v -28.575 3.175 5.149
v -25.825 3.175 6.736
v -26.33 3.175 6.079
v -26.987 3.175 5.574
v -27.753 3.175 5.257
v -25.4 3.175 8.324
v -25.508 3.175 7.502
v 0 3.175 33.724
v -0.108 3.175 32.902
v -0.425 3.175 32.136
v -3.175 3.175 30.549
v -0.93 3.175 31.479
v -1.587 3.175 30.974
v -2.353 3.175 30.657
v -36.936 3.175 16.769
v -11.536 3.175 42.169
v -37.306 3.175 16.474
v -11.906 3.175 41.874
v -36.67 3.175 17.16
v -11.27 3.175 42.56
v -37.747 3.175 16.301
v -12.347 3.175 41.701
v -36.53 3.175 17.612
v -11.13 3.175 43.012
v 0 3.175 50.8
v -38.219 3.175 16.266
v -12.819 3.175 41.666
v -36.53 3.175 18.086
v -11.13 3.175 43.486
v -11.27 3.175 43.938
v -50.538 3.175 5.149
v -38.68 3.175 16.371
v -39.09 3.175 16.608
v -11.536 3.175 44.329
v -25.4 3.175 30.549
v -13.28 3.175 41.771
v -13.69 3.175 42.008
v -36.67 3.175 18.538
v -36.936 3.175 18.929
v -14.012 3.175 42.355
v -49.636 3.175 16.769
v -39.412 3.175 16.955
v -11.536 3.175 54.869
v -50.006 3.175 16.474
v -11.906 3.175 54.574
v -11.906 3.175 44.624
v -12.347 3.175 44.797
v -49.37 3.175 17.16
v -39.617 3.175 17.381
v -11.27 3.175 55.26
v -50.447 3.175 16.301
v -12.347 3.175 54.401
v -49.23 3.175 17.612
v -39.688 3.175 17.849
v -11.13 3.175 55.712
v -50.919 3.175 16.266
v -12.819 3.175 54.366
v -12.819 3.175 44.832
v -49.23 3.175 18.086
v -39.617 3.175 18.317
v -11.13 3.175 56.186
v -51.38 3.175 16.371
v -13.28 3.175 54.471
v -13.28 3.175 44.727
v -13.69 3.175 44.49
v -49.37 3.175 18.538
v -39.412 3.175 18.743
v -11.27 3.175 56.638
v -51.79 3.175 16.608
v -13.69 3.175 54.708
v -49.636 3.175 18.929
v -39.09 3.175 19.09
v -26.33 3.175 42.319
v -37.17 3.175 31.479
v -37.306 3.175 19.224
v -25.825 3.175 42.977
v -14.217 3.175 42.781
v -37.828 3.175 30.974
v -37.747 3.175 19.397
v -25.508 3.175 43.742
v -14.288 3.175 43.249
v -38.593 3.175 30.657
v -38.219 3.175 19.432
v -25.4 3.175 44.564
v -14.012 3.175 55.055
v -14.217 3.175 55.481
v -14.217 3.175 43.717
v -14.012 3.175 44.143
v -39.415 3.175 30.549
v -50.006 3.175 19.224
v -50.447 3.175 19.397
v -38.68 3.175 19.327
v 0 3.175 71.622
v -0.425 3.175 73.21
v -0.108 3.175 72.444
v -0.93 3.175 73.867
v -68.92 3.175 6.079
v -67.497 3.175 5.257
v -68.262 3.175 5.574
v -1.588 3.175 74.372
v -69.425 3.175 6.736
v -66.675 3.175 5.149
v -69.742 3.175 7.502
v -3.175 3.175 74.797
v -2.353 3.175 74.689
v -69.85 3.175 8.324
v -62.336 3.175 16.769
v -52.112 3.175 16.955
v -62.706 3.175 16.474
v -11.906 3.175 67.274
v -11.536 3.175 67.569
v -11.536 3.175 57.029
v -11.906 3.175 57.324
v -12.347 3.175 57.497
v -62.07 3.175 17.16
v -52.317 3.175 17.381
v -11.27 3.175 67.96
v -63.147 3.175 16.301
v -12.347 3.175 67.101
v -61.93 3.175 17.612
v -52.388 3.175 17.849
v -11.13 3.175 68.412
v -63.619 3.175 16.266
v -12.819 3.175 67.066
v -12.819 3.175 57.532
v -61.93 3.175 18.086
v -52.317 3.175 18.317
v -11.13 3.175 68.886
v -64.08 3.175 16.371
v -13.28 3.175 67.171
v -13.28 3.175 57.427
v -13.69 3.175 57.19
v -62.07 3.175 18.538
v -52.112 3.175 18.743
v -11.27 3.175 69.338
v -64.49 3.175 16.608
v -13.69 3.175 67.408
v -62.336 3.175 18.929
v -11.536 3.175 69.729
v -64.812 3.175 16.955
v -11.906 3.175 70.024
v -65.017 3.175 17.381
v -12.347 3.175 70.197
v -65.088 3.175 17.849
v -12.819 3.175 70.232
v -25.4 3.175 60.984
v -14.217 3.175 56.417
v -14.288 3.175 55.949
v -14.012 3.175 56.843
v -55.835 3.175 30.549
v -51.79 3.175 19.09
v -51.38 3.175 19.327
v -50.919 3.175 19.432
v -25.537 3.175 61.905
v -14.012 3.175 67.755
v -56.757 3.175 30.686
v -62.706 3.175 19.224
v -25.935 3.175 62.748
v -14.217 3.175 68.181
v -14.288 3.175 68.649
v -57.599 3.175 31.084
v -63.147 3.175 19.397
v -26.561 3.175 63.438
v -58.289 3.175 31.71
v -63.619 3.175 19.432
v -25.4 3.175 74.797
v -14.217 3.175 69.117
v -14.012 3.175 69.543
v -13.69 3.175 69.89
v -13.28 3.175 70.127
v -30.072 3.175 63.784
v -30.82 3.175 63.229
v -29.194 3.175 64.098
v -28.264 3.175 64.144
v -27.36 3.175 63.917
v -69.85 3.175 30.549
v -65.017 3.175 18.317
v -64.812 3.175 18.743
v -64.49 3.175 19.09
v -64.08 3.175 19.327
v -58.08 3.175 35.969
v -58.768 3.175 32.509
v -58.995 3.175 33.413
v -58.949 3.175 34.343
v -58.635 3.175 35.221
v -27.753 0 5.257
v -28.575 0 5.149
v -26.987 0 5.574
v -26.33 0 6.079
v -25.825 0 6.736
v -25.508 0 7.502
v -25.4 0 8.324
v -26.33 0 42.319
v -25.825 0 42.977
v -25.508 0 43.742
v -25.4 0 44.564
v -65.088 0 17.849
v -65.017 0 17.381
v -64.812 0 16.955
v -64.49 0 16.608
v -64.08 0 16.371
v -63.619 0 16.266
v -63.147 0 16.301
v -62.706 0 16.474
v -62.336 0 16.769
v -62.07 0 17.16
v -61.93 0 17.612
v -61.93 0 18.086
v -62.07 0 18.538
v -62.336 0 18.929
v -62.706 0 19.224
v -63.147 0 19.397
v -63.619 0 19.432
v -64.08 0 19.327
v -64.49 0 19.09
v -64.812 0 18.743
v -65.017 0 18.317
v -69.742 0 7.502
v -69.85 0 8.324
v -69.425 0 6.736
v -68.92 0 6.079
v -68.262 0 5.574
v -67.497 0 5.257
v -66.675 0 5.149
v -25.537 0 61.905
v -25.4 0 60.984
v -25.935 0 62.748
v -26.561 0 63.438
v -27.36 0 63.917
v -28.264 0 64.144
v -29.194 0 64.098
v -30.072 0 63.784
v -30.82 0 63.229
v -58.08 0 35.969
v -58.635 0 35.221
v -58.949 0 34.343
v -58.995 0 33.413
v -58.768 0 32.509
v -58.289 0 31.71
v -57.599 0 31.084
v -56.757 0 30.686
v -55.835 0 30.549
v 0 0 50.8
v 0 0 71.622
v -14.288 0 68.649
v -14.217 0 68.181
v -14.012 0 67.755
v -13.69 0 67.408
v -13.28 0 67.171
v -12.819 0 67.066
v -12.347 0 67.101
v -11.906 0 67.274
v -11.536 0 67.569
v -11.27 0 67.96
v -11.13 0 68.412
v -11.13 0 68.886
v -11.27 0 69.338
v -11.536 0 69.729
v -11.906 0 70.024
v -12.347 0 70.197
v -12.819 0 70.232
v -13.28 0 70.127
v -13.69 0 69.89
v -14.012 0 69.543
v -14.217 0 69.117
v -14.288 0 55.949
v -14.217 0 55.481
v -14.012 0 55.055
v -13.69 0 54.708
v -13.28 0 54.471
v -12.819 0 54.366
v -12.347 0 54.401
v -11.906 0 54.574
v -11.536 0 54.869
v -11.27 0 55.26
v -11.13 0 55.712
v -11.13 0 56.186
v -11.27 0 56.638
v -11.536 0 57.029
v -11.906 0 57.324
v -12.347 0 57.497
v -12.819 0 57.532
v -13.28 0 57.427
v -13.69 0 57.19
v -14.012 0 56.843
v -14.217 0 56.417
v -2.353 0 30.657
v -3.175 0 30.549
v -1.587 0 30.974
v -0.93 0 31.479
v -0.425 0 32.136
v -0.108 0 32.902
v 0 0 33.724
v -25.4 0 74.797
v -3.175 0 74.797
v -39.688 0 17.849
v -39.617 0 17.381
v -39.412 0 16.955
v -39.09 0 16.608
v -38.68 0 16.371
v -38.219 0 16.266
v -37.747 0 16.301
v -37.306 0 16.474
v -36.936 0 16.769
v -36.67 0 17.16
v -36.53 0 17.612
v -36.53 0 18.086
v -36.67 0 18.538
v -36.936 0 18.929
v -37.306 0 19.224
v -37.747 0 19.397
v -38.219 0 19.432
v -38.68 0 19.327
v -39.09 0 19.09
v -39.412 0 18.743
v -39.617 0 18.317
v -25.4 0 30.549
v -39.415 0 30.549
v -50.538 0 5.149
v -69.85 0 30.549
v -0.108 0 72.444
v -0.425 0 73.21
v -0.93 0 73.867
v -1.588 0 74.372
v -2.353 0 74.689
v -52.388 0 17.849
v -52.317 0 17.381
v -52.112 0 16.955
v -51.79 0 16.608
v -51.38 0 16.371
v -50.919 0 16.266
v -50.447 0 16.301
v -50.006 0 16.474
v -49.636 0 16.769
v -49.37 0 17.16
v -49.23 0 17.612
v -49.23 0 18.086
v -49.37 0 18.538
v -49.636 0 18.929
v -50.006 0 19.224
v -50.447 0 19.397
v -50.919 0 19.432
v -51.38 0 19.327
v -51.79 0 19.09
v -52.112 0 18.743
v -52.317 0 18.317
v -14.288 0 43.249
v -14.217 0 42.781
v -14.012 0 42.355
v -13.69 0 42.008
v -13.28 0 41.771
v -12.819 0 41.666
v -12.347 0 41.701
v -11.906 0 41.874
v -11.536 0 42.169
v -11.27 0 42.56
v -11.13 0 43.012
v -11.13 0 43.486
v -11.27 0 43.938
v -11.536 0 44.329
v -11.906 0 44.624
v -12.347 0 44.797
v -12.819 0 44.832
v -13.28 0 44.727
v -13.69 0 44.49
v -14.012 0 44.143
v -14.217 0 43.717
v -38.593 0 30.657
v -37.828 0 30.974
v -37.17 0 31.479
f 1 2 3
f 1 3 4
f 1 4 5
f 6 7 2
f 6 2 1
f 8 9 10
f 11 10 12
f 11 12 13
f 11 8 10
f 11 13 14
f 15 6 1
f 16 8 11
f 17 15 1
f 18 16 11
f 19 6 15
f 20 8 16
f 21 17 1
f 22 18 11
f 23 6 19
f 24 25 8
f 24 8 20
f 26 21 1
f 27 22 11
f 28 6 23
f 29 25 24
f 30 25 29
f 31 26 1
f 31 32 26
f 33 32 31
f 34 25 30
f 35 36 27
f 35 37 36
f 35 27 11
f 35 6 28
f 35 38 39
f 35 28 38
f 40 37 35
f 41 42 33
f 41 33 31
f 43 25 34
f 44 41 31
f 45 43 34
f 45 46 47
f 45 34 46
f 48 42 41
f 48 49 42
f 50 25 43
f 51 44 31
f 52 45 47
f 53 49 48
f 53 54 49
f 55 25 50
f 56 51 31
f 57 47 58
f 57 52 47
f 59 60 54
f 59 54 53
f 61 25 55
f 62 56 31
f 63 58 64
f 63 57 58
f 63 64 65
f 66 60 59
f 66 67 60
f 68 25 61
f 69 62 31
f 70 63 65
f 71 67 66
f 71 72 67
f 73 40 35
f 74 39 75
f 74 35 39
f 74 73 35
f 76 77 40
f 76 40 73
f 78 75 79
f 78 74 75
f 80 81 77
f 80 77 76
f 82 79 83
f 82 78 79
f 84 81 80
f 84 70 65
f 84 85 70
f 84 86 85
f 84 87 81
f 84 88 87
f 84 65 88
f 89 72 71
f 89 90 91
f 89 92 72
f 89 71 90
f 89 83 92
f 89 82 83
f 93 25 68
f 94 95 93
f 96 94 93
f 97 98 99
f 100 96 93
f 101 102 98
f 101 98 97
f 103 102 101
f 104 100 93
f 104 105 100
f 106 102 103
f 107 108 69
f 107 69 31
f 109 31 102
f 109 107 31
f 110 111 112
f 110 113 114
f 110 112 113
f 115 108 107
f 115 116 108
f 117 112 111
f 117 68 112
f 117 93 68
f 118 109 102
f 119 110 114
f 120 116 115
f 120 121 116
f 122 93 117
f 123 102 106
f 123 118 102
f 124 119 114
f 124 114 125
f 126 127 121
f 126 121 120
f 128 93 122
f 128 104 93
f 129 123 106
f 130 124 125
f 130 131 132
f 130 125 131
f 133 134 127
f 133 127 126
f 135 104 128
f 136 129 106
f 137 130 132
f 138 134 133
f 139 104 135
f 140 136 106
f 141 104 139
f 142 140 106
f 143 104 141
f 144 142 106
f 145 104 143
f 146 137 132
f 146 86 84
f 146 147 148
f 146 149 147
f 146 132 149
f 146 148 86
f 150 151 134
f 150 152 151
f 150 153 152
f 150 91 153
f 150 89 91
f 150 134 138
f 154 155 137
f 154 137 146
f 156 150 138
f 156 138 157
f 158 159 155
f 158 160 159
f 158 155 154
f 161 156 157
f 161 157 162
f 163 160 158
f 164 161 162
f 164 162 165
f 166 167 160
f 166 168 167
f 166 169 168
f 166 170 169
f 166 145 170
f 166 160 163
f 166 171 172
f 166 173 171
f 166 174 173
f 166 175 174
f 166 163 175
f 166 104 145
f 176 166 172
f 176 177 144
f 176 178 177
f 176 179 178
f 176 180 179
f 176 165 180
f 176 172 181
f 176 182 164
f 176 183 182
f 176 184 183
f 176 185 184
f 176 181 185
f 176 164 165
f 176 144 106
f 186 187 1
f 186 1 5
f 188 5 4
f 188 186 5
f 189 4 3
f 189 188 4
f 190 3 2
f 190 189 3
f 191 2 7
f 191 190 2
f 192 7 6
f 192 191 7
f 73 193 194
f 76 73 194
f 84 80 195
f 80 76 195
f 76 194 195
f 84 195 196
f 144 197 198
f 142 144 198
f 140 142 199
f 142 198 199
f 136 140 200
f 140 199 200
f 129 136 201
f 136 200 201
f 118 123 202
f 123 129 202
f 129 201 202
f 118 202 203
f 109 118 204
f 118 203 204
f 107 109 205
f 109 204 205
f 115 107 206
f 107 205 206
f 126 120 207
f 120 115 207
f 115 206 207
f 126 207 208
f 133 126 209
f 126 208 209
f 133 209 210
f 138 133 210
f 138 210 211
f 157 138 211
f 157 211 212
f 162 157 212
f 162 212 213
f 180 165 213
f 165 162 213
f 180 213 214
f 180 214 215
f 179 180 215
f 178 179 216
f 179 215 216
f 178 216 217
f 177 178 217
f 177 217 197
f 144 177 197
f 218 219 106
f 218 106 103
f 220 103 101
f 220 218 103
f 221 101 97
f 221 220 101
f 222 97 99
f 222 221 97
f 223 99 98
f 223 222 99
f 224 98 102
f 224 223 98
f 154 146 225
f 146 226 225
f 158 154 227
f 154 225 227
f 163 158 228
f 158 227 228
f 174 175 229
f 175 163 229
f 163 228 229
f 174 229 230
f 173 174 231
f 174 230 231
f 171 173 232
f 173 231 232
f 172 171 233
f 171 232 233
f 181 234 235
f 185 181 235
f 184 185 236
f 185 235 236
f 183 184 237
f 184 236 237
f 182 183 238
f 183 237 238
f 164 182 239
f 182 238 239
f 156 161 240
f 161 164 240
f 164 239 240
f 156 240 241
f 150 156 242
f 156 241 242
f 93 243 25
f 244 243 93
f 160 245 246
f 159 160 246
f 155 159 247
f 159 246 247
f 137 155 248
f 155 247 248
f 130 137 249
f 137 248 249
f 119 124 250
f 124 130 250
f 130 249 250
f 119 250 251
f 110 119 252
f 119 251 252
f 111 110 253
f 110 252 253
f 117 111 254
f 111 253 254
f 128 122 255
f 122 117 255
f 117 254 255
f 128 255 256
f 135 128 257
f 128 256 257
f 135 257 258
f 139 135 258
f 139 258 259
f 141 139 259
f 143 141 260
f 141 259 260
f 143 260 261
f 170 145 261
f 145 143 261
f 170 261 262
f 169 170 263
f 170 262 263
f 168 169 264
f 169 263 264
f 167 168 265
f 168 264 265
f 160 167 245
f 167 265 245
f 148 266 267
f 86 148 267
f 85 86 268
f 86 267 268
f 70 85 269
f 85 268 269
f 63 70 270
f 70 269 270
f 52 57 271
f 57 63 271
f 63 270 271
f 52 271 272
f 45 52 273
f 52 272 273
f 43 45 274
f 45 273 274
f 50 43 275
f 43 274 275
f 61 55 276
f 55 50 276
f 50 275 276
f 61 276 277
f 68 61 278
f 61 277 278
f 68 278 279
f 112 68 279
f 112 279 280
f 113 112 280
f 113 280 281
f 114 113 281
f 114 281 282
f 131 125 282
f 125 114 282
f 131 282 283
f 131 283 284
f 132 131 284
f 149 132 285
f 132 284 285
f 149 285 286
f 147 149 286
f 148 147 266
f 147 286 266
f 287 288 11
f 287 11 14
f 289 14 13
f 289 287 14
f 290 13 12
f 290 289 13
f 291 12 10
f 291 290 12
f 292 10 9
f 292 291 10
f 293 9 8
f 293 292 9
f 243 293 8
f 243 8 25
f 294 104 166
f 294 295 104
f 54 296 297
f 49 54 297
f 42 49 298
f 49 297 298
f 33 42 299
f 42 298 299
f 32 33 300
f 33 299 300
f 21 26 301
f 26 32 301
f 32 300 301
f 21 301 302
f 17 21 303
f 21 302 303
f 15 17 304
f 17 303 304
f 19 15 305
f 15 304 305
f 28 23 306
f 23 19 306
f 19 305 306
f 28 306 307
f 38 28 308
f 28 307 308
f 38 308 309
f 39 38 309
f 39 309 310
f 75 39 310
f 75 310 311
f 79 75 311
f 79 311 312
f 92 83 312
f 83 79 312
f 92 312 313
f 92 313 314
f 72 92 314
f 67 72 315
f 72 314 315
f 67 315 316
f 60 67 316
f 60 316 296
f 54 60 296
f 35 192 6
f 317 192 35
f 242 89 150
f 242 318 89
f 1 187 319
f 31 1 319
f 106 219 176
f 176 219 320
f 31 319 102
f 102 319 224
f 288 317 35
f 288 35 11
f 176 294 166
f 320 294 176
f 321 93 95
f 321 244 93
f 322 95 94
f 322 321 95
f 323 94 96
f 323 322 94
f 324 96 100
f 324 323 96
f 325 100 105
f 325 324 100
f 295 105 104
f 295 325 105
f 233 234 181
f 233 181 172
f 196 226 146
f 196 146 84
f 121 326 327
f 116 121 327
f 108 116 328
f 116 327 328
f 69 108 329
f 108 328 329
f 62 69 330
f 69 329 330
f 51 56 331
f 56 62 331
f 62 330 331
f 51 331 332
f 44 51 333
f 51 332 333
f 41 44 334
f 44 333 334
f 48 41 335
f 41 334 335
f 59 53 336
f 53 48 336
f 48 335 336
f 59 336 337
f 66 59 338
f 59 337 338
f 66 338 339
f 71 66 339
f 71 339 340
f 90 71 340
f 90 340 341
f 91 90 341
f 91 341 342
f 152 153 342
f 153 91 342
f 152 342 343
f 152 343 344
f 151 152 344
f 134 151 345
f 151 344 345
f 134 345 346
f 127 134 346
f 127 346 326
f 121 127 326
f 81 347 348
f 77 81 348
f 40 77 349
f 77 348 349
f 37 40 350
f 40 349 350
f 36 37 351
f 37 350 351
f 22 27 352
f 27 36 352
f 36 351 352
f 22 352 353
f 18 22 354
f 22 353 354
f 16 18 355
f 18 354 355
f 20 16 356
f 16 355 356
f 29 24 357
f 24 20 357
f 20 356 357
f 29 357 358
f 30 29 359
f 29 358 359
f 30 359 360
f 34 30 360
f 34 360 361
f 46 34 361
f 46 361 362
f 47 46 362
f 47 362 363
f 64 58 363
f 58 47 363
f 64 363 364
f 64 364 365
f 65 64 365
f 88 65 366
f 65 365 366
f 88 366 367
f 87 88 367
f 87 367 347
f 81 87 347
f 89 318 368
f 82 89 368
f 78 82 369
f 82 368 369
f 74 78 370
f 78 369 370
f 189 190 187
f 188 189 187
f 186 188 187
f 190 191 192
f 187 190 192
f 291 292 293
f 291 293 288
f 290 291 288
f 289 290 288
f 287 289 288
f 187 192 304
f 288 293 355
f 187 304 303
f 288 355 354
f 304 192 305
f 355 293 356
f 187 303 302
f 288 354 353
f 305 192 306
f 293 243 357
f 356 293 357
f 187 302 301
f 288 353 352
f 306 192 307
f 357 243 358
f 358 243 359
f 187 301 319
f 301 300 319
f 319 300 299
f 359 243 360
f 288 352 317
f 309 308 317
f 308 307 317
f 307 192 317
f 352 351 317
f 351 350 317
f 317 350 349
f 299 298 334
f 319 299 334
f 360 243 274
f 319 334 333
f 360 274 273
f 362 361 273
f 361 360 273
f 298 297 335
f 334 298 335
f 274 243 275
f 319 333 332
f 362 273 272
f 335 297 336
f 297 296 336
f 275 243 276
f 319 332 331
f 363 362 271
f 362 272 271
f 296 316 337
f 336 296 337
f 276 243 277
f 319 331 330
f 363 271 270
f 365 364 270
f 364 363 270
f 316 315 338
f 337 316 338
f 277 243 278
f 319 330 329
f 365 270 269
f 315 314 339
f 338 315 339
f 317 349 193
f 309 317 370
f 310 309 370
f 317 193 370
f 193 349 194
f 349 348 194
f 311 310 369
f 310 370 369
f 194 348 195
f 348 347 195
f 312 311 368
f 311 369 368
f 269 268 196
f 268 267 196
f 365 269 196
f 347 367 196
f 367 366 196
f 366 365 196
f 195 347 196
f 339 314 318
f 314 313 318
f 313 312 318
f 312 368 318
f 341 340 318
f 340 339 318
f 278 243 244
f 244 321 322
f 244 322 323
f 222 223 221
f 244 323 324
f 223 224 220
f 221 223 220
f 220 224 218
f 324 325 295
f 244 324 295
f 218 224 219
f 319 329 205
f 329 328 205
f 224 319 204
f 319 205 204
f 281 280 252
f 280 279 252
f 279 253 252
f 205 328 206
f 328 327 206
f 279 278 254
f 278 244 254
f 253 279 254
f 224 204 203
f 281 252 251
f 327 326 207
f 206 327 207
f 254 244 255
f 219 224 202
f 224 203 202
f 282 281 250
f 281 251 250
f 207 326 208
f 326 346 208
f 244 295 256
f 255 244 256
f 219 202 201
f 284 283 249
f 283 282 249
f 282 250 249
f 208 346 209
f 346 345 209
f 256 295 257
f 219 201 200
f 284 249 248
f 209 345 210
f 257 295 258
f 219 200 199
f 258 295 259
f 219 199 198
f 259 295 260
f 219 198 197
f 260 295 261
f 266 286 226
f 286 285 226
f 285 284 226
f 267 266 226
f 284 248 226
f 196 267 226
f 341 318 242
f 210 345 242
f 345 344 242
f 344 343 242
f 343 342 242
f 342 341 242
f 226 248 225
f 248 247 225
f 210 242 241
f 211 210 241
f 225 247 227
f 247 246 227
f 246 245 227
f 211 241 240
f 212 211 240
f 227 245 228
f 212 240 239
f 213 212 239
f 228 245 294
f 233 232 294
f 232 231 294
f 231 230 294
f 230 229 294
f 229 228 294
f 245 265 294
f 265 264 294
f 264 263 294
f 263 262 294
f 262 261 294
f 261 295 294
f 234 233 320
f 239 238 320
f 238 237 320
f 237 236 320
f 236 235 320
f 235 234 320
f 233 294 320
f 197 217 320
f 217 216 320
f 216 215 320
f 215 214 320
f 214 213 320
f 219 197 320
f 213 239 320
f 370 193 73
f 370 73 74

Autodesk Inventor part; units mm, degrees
ref_plane "YZ Plane" through (0, 0, 0) normal (1, 0, 0) x (0, 1, 0)
ref_plane "XZ Plane" through (0, 0, 0) normal (0, 1, 0) x (-1, 0, 0)
ref_plane "XY Plane" through (0, 0, 0) normal (0, 0, 1) x (1, 0, 0)
sketch "Sketch1" plane through (0, 0, 0) normal (0, 1, 0) x (-1, 0, 0)
  line L0 (28.575, 5.149) -> (50.5384, 5.149)
  line L1 (0, 33.724) -> (0, 50.8)
  line L2 (25.4, 8.324) -> (25.4, 30.549)
  line L3 (25.4, 30.549) -> (3.175, 30.549)
  arc A0 (25.4, 8.324) -> (28.575, 5.149) centre (28.575, 8.324) ccw
  arc A1 (0, 33.724) -> (3.175, 30.549) centre (3.175, 33.724) ccw
  circle A2 centre (12.7, 43.249) radius 1.5875
  circle A3 centre (38.1, 17.849) radius 1.5875
  circle A4 centre (50.8, 17.849) radius 1.5875
  circle A5 centre (63.5, 17.849) radius 1.5875
  line L4 (50.5384, 5.149) -> (66.675, 5.149)
  line L5 (69.85, 8.324) -> (69.85, 30.549)
  arc A6 (66.675, 5.149) -> (69.85, 8.324) centre (66.675, 8.324) ccw
  circle A7 centre (12.7, 55.949) radius 1.5875
  circle A8 centre (12.7, 68.649) radius 1.5875
  line L6 (0, 50.8) -> (0, 71.6223)
  line L7 (3.175, 74.7973) -> (25.4, 74.7973)
  arc A9 (3.175, 74.7973) -> (0, 71.6223) centre (3.175, 71.6223) ccw
  line L8 (25.4, 74.7973) -> (69.85, 30.549)
  line L9 (26.3299, 42.319) -> (37.1701, 31.4789)
  line L10 (39.4151, 30.549) -> (55.8349, 30.549)
  line L11 (58.0799, 35.969) -> (30.8201, 63.2289)
  line L12 (25.4, 60.9838) -> (25.4, 44.5641)
  arc A10 (30.8201, 63.2289) -> (25.4, 60.9838) centre (28.575, 60.9838) ccw
  arc A11 (55.8349, 30.549) -> (58.0799, 35.969) centre (55.8349, 33.724) ccw
  arc A12 (37.1701, 31.4789) -> (39.4151, 30.549) centre (39.4151, 33.724) ccw
  arc A13 (25.4, 44.5641) -> (26.3299, 42.319) centre (28.575, 44.5641) ccw
  point P0 (0, 0)
  point P1 (25.4, 5.149)
  point P2 (0, 42.262)
  point P3 (25.4, 19.4365)
  point P4 (39.5567, 5.149)
  point P5 (69.85, 5.149)
  point P6 (0, 74.7973)
  point P7 (14.2875, 74.7973)
  point P8 (38.1, 30.549)
  point P9 (63.5, 30.549)
  dimension "d0" = 50.8
  dimension "d1" = 50.8
  dimension "d2" = 25.4
  dimension "d3" = 3.175
  dimension "d4" = 3.175
  dimension "d5" = 12.7
  dimension "d6" = 12.7
  dimension "d7" = 3.175
  dimension "d8" = 12.7
  dimension "d9" = 12.7
  dimension "d12" = 12.7
  dimension "d17" = 25.4
  dimension "d18" = 6.35
  dimension "d19" = 3.175
  dimension "d22" = 12.7
  dimension "d27" = 25.4
  dimension "d28" = 6.35
  dimension "d29" = 3.175
  dimension "d30" = 25.4
  dimension "d31" = 6.35
  dimension "d32" = 3.175
extrude "Extrusion1" add sketch "Sketch1" along normal blind 3.175
properties part number "Cut L-Bracket (5x5)"
